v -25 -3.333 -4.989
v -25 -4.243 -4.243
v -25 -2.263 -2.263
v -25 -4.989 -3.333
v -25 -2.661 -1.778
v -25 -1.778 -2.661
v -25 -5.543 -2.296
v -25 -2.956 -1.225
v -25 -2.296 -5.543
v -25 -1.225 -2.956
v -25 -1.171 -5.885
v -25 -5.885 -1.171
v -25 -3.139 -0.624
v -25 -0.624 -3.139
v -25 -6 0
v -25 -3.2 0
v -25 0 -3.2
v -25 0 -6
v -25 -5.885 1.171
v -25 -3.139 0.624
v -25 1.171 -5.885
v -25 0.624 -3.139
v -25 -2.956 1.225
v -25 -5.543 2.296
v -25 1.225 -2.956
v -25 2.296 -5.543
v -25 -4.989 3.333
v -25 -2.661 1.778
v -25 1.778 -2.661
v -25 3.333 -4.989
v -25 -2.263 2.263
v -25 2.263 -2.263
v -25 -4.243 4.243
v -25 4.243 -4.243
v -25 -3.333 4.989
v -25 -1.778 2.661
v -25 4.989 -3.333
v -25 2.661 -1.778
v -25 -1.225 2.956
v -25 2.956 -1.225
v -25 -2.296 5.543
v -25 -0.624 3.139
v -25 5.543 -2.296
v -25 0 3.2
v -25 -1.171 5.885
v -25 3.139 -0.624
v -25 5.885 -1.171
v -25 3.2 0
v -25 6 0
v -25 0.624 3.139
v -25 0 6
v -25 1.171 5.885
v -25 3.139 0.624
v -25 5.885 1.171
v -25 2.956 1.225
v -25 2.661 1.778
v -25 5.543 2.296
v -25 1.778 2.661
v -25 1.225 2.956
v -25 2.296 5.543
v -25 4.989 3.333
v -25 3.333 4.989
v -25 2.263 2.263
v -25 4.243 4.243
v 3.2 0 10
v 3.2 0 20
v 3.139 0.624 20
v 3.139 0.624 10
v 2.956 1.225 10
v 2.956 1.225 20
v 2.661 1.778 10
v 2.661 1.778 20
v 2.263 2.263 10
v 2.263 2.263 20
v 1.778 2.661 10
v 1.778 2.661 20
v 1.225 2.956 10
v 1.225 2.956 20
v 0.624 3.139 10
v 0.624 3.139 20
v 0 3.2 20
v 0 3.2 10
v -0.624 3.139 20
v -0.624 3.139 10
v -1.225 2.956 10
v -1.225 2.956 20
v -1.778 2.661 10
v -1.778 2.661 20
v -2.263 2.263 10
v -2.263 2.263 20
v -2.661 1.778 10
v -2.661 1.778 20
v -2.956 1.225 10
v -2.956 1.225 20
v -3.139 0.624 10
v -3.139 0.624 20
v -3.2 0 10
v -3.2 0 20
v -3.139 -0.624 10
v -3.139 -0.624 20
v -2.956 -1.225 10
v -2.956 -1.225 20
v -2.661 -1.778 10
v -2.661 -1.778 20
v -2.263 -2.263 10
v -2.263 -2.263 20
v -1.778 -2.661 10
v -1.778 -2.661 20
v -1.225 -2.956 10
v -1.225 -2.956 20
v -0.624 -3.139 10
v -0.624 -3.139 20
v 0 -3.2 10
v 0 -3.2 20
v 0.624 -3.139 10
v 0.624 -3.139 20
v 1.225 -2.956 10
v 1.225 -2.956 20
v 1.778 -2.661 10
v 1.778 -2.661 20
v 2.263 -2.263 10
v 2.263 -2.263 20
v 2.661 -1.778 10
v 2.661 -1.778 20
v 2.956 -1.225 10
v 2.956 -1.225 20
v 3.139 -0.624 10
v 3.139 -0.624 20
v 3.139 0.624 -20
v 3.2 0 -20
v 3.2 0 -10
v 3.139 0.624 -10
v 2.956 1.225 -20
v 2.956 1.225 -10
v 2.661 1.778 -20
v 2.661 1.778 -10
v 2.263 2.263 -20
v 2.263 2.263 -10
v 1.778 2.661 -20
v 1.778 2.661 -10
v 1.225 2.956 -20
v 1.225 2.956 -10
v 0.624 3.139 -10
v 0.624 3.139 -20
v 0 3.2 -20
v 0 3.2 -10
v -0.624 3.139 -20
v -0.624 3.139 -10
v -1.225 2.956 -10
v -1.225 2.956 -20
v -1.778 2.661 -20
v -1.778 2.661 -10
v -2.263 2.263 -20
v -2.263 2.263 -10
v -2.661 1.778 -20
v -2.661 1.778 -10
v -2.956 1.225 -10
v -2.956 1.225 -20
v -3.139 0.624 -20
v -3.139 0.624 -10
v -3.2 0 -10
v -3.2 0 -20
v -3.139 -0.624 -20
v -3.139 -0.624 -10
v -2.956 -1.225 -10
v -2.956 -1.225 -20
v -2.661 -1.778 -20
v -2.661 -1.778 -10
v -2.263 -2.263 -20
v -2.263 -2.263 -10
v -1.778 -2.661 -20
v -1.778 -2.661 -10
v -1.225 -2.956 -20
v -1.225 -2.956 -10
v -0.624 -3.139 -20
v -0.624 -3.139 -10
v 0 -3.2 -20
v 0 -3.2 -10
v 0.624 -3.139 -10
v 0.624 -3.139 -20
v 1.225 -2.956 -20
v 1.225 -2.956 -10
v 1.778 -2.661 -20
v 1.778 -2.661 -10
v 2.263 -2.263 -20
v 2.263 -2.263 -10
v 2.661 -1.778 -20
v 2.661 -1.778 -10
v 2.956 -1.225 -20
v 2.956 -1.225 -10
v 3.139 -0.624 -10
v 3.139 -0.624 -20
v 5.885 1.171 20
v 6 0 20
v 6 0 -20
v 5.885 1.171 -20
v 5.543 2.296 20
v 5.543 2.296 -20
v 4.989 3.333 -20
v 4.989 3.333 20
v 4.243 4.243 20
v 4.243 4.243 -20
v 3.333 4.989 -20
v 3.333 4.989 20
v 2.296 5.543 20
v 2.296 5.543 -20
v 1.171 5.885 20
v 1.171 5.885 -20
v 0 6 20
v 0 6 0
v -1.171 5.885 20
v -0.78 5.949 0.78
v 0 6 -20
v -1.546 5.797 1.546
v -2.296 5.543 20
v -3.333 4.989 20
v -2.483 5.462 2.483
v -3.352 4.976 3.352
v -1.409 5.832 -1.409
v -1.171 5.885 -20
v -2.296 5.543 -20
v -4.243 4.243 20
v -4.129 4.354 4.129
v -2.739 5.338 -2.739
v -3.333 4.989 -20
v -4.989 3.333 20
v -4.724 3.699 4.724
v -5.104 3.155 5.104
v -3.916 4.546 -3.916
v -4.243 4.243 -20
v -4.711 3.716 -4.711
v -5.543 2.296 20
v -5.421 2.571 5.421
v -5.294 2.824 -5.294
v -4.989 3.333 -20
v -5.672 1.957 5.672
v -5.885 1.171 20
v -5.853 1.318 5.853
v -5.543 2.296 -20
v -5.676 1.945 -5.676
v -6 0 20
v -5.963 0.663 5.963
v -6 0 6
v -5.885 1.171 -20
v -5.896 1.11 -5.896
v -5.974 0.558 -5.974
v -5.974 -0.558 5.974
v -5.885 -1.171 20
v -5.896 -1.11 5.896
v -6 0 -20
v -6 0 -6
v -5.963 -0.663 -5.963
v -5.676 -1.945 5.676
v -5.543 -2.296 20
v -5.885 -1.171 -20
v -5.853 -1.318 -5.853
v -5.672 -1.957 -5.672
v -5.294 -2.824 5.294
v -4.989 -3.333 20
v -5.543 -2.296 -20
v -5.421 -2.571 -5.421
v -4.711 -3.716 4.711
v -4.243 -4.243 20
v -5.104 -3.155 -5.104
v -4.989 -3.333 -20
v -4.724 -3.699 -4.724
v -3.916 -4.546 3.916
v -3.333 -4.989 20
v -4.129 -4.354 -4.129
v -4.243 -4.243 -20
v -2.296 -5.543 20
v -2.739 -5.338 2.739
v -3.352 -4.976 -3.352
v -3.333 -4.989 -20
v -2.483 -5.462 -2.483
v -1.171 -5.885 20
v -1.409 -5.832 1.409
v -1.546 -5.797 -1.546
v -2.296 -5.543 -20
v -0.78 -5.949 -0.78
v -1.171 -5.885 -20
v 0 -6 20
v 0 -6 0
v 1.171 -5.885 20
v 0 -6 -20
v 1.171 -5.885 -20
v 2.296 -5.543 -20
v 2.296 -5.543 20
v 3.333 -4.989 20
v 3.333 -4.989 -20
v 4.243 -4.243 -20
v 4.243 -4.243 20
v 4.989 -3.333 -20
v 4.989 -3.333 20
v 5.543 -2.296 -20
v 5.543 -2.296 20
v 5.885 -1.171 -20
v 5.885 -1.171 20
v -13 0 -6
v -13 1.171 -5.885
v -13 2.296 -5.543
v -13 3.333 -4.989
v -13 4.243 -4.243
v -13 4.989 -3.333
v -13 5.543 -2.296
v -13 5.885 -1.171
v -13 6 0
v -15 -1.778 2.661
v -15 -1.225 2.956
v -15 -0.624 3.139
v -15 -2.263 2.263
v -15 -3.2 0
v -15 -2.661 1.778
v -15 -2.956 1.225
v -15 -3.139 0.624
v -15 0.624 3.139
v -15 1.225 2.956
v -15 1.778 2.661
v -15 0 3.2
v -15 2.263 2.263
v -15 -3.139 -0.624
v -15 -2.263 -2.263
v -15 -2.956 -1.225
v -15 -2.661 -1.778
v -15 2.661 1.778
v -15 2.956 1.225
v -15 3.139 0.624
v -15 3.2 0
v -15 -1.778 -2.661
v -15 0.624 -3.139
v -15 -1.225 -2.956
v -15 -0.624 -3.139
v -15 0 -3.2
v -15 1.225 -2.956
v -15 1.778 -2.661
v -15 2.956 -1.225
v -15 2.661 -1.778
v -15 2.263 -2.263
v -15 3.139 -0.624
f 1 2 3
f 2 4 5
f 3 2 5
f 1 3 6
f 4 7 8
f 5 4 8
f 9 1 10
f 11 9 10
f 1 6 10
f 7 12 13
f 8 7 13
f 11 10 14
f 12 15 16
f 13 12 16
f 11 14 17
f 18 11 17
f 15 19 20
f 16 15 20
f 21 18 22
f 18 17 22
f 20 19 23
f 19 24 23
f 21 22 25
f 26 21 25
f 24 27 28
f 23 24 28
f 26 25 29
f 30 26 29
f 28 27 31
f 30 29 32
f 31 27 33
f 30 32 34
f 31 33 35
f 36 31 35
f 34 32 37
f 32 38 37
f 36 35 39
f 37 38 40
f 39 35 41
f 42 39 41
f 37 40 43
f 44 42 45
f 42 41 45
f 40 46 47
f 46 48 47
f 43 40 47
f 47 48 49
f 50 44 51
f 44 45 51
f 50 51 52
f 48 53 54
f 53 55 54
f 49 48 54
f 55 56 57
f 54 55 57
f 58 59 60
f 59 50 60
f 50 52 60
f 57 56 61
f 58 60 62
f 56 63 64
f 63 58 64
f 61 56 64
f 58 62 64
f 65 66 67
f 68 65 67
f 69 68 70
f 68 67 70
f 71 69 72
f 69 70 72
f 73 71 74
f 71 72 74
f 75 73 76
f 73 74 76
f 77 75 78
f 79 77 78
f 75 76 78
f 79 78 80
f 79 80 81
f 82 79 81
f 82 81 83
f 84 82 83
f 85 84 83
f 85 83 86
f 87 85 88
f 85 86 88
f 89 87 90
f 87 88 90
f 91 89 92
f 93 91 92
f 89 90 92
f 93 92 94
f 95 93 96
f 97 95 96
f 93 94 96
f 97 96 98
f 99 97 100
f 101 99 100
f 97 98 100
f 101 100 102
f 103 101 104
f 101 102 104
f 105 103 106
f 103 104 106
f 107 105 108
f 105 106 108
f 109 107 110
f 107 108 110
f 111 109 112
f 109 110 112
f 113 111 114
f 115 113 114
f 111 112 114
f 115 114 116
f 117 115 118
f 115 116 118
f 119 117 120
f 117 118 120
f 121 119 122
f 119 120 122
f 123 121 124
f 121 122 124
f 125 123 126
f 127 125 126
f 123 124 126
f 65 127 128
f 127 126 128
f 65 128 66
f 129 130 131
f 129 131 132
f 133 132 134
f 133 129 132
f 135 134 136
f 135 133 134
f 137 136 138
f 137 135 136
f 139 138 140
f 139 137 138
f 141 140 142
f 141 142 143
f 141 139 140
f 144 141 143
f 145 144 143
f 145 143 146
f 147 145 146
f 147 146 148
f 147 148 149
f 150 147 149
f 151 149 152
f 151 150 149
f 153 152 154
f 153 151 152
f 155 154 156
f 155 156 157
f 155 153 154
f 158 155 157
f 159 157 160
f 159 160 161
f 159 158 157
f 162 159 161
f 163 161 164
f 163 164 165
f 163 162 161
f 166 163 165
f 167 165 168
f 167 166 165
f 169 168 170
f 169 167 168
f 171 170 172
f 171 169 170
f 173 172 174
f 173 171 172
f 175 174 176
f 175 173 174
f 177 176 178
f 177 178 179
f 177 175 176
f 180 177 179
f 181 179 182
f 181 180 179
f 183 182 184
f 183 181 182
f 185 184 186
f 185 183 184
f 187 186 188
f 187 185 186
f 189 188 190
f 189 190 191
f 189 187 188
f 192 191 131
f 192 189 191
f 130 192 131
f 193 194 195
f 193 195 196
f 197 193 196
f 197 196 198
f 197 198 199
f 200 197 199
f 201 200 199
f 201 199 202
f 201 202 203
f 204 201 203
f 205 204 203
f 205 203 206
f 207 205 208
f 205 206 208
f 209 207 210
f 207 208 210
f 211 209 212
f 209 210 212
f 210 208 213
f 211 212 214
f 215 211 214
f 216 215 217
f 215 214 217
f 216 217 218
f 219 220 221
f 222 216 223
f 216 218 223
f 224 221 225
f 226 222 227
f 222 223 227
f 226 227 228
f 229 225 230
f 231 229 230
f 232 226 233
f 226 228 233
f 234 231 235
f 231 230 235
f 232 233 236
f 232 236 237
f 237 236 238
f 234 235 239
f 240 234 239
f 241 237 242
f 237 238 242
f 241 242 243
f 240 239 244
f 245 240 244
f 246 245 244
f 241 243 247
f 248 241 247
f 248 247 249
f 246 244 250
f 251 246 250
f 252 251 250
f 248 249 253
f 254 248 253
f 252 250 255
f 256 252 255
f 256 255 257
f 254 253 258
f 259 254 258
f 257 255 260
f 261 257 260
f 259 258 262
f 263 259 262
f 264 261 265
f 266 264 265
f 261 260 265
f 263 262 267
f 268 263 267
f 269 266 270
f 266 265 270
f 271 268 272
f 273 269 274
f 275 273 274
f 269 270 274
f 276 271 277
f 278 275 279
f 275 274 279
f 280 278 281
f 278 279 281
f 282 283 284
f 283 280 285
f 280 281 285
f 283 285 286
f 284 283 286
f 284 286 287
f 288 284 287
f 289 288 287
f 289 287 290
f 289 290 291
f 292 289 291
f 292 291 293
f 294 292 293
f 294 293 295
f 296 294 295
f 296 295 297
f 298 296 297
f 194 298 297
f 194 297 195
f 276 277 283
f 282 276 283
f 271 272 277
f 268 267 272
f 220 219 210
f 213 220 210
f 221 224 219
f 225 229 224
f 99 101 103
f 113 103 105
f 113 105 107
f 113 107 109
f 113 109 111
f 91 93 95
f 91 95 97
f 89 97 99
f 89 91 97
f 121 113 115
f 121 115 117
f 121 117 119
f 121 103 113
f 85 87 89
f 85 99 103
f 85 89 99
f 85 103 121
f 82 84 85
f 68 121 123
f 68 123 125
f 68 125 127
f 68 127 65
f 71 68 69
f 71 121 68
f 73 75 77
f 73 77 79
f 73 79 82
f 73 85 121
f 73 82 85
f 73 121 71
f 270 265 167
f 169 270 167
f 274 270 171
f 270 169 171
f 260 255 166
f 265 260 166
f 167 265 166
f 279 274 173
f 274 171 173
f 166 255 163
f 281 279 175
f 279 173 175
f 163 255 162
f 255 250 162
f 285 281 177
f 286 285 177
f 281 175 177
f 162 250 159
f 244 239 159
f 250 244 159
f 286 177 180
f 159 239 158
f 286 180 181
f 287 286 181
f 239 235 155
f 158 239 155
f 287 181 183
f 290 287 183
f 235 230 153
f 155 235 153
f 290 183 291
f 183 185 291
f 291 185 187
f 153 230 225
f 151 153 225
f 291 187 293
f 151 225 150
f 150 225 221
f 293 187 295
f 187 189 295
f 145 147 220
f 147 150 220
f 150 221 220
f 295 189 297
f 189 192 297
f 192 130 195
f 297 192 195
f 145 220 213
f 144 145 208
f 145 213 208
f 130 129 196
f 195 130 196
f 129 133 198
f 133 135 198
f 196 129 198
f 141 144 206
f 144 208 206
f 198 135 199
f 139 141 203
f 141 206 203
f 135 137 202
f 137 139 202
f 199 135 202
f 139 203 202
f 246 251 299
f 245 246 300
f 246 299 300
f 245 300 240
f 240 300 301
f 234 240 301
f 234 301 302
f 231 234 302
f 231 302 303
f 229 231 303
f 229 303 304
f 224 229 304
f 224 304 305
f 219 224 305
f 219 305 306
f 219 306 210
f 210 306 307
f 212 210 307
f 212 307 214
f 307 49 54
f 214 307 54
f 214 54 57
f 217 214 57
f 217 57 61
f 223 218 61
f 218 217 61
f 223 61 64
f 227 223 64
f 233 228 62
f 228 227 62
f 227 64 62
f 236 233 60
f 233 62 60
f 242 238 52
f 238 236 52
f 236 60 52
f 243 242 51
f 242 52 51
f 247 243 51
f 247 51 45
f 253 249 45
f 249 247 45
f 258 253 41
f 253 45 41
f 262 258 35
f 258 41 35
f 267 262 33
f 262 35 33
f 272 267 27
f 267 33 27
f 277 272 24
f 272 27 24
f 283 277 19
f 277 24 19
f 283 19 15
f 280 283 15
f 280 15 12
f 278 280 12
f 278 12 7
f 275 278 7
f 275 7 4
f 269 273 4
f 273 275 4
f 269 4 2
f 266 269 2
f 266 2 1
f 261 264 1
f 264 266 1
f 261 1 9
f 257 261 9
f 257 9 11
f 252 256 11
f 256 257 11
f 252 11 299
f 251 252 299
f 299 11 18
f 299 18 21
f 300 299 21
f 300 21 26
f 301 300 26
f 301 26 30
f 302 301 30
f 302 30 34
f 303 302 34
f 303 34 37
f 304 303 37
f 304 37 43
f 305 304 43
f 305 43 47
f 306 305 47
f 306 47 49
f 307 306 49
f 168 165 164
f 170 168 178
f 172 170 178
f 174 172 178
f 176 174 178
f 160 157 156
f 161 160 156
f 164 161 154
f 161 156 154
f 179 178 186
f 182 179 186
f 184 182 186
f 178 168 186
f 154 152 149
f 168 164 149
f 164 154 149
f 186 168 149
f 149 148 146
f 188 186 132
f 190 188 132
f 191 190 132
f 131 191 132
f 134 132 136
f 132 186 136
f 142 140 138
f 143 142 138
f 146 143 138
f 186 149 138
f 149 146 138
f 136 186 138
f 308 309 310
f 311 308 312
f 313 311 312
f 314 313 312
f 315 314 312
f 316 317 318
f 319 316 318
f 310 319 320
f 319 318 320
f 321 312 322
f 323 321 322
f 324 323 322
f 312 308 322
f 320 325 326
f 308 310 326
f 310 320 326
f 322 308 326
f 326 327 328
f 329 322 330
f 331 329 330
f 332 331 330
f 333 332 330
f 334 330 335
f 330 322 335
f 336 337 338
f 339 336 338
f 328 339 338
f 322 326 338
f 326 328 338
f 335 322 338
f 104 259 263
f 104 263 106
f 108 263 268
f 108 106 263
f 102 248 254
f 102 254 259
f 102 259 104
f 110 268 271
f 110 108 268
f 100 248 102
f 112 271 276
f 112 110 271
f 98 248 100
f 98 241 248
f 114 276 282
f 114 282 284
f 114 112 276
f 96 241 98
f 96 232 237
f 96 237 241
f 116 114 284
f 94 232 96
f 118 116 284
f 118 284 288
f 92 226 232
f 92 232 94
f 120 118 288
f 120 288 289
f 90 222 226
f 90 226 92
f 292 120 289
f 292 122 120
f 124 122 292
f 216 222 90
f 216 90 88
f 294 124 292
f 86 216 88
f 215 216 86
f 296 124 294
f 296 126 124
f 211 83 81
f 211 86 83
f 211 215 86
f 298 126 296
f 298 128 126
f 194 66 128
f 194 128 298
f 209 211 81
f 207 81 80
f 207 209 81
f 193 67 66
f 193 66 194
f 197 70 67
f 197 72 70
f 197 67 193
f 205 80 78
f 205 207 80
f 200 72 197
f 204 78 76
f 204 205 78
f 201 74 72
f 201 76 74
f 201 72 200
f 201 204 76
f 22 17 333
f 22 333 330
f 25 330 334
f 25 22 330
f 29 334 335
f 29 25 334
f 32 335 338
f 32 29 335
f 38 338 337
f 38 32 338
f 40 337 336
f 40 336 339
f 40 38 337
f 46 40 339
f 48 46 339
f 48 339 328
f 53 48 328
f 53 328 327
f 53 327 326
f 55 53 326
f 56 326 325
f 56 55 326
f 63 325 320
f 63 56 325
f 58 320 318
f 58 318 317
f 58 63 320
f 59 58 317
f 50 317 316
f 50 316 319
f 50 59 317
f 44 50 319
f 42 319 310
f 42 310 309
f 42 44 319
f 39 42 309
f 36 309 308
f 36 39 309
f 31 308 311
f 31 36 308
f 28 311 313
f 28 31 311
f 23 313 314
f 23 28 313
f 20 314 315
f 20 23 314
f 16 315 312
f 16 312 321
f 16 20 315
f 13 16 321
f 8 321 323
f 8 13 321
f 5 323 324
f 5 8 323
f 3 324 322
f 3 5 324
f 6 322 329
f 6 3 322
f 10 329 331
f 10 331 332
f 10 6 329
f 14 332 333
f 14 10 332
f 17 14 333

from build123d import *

# Parameters (mm, degrees)
BRANCH_HUB_START       = -13
SKETCH1_R              = 6
BRANCH_HUB_DEPTH       = 13
RUN_BACK_PORT_START    = -20
SKETCH2_R              = 6
RUN_BACK_PORT_DEPTH    = 12
RUN_BACK_SOCKET_START  = -20
SKETCH3_R              = 3.2
RUN_BACK_SOCKET_DEPTH  = 10
RUN_FRONT_PORT_START   = 8
SKETCH4_R              = 6
RUN_FRONT_PORT_DEPTH   = 12
RUN_FRONT_SOCKET_START = 20
SKETCH5_R              = 3.2
RUN_FRONT_SOCKET_DEPTH = 10
RUN_HUB_START          = -8
SKETCH6_R              = 6
RUN_HUB_DEPTH          = 16
BRANCH_PORT_START      = -25
SKETCH7_R              = 6
BRANCH_PORT_DEPTH      = 12
BRANCH_SOCKET_START    = -25
SKETCH8_R              = 3.2
BRANCH_SOCKET_DEPTH    = 10


with BuildPart() as part:
    # Sketch1 → Branch_Hub (new body)
    with BuildSketch(Plane(origin=(0, 0, 0), x_dir=(0, 0, -1), z_dir=(1, 0, 0)).offset(BRANCH_HUB_START)):
        Circle(SKETCH1_R)
    extrude(amount=BRANCH_HUB_DEPTH)



with BuildPart() as body_2:
    # Sketch2 → Run_Back_Port (new body)
    with BuildSketch(Plane.XY.offset(RUN_BACK_PORT_START)):
        Circle(SKETCH2_R)
    extrude(amount=RUN_BACK_PORT_DEPTH)

    # Sketch3 → Run_Back_Socket (cut)
    with BuildSketch(Plane.XY.offset(RUN_BACK_SOCKET_START)):
        Circle(SKETCH3_R)
    extrude(amount=RUN_BACK_SOCKET_DEPTH, mode=Mode.SUBTRACT)


with BuildPart() as body_3:
    # Sketch4 → Run_Front_Port (new body)
    with BuildSketch(Plane.XY.offset(RUN_FRONT_PORT_START)):
        Circle(SKETCH4_R)
    extrude(amount=RUN_FRONT_PORT_DEPTH)

    # Sketch5 → Run_Front_Socket (cut)
    with BuildSketch(Plane.XY.offset(RUN_FRONT_SOCKET_START)):
        Circle(SKETCH5_R)
    extrude(amount=-RUN_FRONT_SOCKET_DEPTH, mode=Mode.SUBTRACT)


with BuildPart() as part_1:
    add(part.part)

    add(body_2.part)  # Run_Hub merges body 2

    add(body_3.part)  # Run_Hub merges body 3
    # Sketch6 → Run_Hub (add)
    with BuildSketch(Plane.XY.offset(RUN_HUB_START)):
        Circle(SKETCH6_R)
    extrude(amount=RUN_HUB_DEPTH)

    # Sketch7 → Branch_Port (add)
    with BuildSketch(Plane(origin=(0, 0, 0), x_dir=(0, 0, -1), z_dir=(1, 0, 0)).offset(BRANCH_PORT_START)):
        with Locations(Location((0, 0, 0), (0, 0, 90))):
            Circle(SKETCH7_R)
    extrude(amount=BRANCH_PORT_DEPTH)

    # Sketch8 → Branch_Socket (cut)
    with BuildSketch(Plane(origin=(0, 0, 0), x_dir=(0, 0, -1), z_dir=(1, 0, 0)).offset(BRANCH_SOCKET_START)):
        Circle(SKETCH8_R)
    extrude(amount=BRANCH_SOCKET_DEPTH, mode=Mode.SUBTRACT)


solid = part_1.part
